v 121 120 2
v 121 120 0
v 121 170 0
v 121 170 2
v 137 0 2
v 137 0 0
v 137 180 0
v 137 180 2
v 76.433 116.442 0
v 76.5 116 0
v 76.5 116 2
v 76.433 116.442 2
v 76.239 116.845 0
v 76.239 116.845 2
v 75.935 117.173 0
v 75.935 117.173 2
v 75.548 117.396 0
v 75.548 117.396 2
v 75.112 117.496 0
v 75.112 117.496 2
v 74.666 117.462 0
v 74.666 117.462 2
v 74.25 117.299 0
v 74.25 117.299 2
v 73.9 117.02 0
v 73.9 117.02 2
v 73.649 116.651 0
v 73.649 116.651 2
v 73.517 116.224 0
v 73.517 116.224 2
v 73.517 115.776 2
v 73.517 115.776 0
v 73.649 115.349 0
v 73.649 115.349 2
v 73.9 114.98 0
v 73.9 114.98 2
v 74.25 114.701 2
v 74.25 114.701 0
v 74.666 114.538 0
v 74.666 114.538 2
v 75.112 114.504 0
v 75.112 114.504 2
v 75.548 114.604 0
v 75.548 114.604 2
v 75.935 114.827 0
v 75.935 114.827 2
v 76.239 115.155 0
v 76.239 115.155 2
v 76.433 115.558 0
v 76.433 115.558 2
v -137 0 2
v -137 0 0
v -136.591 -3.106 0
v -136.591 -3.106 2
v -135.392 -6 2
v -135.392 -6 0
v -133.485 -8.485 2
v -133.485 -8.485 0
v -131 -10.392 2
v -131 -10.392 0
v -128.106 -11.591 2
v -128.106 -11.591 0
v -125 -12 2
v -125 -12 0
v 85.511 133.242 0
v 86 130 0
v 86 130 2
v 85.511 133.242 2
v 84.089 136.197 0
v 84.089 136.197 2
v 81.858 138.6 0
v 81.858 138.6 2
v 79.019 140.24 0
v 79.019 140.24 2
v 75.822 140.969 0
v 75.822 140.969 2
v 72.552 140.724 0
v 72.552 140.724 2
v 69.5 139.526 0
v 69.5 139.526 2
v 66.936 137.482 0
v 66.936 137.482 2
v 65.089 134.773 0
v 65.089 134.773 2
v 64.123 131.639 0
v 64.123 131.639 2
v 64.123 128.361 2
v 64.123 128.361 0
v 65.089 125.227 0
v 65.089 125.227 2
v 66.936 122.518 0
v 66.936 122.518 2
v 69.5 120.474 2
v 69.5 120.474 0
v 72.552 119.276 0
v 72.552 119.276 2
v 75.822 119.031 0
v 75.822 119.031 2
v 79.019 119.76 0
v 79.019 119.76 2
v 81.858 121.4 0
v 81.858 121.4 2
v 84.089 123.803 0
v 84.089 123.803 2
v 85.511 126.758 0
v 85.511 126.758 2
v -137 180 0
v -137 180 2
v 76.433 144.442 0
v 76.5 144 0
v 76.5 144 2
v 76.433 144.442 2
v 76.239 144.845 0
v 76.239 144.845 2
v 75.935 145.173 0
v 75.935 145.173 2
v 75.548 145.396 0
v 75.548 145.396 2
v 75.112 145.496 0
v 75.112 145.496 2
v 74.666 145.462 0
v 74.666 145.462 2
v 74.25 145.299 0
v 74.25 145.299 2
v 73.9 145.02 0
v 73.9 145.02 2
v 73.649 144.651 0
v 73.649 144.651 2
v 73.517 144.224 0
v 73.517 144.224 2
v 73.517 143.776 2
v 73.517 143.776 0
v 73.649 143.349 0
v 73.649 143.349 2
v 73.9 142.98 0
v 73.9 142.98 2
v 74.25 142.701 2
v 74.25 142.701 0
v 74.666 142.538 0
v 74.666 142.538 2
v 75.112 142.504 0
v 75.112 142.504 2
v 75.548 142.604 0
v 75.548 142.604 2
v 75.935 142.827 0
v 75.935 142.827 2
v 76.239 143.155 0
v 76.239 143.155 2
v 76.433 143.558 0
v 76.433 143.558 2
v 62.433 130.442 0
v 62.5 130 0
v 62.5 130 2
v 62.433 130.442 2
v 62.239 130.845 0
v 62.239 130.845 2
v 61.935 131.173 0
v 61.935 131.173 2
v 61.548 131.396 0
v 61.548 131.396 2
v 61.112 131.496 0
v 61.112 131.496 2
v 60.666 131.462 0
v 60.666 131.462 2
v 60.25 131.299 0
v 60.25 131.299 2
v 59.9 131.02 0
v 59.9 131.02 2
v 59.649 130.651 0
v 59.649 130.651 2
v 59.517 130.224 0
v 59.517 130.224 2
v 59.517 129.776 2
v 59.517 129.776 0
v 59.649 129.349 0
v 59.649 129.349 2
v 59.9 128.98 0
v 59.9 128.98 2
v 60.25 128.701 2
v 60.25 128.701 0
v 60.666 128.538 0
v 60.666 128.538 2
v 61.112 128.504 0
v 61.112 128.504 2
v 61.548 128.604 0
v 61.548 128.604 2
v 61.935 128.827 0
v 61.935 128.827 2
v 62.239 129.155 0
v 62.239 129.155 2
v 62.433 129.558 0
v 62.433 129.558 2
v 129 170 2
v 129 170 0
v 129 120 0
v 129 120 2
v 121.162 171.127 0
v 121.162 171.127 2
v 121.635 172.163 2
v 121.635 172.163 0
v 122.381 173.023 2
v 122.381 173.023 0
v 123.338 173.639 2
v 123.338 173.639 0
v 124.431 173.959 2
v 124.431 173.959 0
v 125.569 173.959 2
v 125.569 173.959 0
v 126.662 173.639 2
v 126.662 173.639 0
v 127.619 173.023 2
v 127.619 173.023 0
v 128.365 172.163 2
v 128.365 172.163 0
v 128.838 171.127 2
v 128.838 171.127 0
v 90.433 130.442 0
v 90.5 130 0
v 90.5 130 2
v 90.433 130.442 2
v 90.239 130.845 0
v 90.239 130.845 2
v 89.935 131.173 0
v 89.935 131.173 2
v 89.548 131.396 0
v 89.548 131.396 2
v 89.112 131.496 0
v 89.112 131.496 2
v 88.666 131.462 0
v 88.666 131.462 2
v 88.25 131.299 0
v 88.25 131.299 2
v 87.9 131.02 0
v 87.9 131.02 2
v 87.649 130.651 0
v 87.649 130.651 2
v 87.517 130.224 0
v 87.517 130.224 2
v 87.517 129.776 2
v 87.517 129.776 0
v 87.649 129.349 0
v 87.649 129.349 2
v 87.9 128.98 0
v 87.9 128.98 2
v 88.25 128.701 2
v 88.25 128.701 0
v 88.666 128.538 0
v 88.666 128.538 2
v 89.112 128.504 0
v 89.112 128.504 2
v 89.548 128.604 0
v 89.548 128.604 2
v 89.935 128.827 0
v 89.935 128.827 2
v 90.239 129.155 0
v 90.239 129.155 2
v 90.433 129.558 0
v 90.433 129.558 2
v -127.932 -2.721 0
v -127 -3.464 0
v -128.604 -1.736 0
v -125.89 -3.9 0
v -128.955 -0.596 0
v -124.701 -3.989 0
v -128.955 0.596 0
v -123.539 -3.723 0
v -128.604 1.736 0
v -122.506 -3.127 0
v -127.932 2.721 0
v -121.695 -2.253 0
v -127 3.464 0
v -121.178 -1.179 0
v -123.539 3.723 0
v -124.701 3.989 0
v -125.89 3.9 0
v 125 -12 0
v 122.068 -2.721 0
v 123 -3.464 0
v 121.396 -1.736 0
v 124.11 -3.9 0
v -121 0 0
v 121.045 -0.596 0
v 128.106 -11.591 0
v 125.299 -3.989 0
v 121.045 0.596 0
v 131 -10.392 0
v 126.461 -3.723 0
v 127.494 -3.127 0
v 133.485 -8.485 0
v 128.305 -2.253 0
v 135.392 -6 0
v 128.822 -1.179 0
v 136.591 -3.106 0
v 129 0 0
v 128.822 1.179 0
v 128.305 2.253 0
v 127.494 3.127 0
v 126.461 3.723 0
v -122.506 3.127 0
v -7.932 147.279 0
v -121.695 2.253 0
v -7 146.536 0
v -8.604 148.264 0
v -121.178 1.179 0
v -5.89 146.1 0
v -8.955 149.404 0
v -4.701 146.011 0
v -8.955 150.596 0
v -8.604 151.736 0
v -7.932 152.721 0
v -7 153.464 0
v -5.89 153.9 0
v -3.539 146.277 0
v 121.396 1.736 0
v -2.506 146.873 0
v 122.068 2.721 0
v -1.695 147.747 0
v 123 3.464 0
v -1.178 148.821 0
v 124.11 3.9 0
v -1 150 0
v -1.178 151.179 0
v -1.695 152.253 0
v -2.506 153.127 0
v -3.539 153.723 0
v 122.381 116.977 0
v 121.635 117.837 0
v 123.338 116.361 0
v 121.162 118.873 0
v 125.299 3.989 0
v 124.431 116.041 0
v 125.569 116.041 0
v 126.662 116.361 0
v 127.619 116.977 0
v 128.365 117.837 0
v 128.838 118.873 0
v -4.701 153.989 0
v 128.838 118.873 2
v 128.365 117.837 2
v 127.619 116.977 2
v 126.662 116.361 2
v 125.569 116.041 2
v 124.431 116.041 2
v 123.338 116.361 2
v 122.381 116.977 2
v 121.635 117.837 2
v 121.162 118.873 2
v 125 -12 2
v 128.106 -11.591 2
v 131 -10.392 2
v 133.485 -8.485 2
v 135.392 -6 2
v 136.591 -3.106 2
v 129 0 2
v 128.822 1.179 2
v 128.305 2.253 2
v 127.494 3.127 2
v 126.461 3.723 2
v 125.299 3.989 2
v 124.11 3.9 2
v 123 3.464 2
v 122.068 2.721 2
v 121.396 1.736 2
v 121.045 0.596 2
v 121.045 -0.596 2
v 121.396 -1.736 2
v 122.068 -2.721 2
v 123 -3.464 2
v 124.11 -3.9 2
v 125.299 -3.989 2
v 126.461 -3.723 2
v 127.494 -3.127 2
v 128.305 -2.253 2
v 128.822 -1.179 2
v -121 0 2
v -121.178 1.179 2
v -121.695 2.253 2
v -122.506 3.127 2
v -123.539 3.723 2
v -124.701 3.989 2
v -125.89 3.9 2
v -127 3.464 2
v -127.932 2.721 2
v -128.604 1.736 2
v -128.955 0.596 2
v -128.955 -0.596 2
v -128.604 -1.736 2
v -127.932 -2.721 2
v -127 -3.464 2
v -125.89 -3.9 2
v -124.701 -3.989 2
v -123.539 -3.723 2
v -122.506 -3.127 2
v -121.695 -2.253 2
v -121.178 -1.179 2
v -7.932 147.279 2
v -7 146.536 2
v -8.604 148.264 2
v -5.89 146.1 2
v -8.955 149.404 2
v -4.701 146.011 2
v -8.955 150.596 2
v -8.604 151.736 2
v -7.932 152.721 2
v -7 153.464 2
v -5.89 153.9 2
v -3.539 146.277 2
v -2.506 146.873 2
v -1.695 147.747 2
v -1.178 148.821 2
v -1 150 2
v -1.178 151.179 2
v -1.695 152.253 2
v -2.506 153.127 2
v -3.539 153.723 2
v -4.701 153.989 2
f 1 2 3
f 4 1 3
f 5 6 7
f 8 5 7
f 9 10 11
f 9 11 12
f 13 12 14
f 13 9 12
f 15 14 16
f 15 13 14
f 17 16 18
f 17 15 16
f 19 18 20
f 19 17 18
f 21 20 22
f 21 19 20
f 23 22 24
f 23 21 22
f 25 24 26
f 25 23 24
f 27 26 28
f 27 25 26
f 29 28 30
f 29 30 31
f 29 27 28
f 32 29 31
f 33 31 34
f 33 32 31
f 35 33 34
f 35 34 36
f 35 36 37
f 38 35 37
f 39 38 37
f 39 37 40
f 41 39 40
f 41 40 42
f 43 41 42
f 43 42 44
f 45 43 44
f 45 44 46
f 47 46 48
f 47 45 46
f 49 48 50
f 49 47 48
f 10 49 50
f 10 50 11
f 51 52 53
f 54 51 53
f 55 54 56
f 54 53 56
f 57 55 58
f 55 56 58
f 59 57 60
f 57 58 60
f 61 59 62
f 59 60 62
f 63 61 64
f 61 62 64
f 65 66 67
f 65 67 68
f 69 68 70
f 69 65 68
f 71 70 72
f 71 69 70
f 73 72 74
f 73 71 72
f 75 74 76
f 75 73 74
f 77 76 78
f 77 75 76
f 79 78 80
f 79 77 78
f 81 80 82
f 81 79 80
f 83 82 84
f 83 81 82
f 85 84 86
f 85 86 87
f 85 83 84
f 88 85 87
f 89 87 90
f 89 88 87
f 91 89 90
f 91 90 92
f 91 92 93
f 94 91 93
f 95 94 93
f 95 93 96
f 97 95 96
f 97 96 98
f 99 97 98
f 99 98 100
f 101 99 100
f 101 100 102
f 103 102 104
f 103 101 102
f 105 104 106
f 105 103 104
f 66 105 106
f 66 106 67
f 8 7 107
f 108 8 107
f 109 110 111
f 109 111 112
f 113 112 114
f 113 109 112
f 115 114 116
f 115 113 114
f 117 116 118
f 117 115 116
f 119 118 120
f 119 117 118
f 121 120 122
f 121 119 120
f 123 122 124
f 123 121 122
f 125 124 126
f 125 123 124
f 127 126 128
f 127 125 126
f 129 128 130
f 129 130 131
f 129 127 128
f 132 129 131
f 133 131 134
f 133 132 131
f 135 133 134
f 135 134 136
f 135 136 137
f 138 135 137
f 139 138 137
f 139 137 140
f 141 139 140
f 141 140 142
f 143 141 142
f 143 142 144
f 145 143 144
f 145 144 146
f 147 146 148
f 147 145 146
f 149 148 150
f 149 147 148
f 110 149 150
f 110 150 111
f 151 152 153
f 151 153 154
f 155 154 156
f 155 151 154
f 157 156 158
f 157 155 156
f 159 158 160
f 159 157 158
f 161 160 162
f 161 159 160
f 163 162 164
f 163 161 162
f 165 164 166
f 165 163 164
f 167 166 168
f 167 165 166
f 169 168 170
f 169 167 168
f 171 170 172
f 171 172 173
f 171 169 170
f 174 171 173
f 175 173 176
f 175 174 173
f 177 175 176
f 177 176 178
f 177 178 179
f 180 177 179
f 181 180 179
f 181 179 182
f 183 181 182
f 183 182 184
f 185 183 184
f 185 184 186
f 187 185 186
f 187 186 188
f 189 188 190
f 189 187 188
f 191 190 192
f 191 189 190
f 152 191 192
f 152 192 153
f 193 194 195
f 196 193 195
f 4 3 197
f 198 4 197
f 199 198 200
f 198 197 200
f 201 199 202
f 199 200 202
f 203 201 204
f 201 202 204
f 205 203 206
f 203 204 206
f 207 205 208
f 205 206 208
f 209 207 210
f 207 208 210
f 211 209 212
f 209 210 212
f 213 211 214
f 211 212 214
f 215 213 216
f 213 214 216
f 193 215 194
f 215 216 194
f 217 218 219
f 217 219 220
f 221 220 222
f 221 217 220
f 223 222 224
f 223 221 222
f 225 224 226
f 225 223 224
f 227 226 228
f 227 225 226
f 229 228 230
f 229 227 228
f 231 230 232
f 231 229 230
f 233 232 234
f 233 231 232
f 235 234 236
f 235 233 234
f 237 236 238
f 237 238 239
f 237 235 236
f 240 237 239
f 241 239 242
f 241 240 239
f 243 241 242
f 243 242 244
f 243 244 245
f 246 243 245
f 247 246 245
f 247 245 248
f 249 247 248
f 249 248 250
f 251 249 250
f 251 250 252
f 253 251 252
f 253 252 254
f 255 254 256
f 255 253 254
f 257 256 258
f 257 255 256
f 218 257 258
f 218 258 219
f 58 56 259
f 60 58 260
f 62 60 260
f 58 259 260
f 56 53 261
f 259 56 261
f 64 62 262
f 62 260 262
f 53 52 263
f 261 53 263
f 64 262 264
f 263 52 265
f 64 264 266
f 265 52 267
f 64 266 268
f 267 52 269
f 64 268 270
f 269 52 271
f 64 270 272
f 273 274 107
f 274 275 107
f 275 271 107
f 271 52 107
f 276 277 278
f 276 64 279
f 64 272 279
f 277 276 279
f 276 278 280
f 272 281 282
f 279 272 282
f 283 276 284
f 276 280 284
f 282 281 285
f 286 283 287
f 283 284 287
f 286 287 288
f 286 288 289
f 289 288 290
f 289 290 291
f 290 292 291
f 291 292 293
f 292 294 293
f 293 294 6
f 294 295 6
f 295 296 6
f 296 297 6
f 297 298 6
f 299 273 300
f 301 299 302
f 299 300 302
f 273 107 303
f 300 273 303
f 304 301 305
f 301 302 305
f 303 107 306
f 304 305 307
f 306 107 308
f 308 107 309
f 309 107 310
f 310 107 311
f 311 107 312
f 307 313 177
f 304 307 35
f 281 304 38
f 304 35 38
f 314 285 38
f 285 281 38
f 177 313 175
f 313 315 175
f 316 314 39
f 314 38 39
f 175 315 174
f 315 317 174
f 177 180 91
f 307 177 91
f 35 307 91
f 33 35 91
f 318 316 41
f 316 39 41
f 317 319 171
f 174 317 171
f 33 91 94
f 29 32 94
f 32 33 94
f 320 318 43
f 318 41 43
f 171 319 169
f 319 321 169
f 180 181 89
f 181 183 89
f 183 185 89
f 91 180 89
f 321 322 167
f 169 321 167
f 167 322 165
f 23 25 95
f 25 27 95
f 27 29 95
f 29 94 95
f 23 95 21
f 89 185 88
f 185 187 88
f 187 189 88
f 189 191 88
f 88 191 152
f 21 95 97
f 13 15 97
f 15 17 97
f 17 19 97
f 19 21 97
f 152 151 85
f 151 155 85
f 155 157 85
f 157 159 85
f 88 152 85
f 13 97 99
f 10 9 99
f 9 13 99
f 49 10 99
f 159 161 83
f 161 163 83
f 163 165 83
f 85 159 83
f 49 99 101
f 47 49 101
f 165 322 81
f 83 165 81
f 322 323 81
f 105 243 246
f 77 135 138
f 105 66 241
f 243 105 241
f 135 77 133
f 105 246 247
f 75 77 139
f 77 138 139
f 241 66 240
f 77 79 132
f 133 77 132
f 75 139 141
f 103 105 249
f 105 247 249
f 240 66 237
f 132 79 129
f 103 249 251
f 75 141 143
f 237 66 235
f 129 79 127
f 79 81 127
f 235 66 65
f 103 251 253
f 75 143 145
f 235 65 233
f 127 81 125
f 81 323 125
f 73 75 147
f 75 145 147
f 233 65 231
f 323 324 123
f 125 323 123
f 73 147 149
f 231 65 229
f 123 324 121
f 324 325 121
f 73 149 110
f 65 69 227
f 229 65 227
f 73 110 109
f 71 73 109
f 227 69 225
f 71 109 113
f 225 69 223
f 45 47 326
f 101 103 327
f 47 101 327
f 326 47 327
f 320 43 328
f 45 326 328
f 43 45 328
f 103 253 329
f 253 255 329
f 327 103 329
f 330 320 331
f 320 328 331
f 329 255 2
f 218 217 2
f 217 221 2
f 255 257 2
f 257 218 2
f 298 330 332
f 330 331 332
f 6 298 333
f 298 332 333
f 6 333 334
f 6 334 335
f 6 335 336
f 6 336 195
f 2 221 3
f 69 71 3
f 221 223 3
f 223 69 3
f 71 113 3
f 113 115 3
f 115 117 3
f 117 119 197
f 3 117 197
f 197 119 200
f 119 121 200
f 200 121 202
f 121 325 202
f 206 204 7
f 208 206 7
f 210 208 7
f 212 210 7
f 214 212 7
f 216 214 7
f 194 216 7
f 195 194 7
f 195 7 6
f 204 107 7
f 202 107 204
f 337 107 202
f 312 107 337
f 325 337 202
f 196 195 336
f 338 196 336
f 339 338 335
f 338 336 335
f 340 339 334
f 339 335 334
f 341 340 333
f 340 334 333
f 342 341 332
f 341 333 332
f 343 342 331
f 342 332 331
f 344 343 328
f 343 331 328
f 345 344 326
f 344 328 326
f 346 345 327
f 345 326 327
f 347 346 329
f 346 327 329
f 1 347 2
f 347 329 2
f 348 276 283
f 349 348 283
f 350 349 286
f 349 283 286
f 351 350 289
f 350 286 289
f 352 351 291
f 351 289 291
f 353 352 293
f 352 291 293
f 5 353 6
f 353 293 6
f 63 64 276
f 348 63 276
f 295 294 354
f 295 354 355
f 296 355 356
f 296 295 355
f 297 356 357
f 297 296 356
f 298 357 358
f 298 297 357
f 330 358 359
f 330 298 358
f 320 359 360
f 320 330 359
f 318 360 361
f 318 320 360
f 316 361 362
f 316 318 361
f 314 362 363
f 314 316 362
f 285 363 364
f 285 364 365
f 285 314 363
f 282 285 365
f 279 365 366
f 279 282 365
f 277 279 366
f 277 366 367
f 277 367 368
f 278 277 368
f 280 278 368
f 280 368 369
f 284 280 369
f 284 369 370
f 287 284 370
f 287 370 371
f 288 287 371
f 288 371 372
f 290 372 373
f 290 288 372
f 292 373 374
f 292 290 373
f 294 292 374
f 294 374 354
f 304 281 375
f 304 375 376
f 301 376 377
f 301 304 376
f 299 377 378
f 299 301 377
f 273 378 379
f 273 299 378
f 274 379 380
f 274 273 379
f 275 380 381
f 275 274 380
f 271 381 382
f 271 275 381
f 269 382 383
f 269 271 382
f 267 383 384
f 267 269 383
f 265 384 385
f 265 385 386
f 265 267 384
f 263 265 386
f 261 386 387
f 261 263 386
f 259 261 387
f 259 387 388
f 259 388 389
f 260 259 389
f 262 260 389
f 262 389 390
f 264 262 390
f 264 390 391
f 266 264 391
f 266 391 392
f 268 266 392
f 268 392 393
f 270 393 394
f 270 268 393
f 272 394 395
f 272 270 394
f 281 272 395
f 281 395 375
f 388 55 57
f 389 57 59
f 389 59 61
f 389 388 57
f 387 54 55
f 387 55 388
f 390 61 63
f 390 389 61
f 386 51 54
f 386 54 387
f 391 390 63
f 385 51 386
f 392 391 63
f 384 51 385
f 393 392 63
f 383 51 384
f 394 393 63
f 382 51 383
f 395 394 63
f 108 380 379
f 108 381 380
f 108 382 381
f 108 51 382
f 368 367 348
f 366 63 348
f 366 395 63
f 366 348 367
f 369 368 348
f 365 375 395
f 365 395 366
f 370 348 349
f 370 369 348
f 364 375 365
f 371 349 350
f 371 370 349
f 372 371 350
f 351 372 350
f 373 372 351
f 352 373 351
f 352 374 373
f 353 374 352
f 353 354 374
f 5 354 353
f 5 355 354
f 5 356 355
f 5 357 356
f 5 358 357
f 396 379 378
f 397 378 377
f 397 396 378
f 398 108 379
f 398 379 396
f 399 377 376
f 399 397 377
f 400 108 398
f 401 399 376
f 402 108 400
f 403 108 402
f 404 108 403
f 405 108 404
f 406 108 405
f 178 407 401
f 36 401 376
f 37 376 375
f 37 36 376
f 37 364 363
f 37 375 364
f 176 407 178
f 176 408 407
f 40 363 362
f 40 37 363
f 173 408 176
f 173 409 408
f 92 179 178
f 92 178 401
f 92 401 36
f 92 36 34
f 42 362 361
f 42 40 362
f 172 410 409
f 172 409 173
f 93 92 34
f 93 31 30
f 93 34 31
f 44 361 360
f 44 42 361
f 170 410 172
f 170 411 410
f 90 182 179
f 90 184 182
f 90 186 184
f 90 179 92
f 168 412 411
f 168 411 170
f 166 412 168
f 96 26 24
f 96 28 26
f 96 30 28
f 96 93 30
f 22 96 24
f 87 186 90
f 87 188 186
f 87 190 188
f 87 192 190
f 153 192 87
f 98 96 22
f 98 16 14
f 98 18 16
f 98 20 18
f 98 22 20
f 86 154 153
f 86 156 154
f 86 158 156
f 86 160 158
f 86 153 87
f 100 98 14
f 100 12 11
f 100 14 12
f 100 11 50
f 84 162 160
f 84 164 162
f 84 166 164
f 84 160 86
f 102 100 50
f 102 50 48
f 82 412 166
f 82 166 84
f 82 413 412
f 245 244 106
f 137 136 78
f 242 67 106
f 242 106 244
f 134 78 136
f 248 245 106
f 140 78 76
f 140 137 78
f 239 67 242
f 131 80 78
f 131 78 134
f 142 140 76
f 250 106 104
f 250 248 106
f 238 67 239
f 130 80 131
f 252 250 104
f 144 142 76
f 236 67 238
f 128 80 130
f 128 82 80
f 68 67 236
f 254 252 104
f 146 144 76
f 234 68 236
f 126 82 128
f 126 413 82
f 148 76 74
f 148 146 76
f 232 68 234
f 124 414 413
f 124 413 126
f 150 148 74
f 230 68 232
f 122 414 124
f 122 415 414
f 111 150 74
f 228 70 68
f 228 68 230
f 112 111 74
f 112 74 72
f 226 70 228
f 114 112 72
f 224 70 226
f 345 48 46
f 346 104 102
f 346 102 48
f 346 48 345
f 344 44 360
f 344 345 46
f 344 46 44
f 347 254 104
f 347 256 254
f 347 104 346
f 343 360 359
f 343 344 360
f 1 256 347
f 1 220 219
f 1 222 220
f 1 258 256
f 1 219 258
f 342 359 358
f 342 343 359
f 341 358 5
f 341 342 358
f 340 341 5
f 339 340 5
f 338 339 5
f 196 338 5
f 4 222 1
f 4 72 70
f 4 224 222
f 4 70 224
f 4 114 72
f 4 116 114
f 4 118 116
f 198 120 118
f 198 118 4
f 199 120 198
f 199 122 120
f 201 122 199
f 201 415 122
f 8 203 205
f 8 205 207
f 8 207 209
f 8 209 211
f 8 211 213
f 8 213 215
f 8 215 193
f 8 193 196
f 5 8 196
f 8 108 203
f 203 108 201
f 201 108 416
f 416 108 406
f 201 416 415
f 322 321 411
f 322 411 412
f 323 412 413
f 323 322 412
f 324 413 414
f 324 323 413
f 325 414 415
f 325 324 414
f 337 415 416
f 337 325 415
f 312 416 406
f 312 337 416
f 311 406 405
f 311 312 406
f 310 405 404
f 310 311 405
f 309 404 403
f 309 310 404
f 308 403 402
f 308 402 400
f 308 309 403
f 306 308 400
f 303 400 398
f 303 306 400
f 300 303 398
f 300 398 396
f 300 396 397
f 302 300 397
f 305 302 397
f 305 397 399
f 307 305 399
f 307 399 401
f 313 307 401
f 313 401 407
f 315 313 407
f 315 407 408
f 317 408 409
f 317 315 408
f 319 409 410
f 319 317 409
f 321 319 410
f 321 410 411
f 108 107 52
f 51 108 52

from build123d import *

# Parameters (mm, degrees)
SKETCH1_R           = 4
SKETCH1_R_2         = 1.5
SKETCH1_R_3         = 11
BOSS_EXTRUDE1_DEPTH = 2


with BuildPart() as part:
    # Sketch1 → Boss-Extrude1 (new body)
    with BuildSketch(Plane.XY):
        with BuildLine():
            ThreePointArc((-137, 0), (-133.485281374, -8.485281374), (-125, -12))
            Line((-125, -12), (125, -12))
            ThreePointArc((125, -12), (133.485281374, -8.485281374), (137, 0))
            Line((137, 0), (137, 180))
            Line((137, 180), (-53.998245329, 180))
            Line((-53.998245329, 180), (-137, 180))
            Line((-137, 180), (-137, 0))
        make_face()
        with Locations((-125, 0)):
            Circle(SKETCH1_R, mode=Mode.SUBTRACT)
        with Locations((125, 0)):
            Circle(SKETCH1_R, mode=Mode.SUBTRACT)
        with Locations((-5, 150)):
            Circle(SKETCH1_R, mode=Mode.SUBTRACT)
        with Locations((61, 130)):
            Circle(SKETCH1_R_2, mode=Mode.SUBTRACT)
        with Locations((75, 116)):
            Circle(SKETCH1_R_2, mode=Mode.SUBTRACT)
        with Locations((75, 130)):
            Circle(SKETCH1_R_3, mode=Mode.SUBTRACT)
        with Locations((89, 130)):
            Circle(SKETCH1_R_2, mode=Mode.SUBTRACT)
        with Locations((75, 144)):
            Circle(SKETCH1_R_2, mode=Mode.SUBTRACT)
        with BuildLine():
            ThreePointArc((129, 120), (125, 116), (121, 120))
            Line((121, 120), (121, 170))
            ThreePointArc((121, 170), (125, 174), (129, 170))
            Line((129, 170), (129, 120))
        make_face(mode=Mode.SUBTRACT)
    extrude(amount=BOSS_EXTRUDE1_DEPTH)


solid = part.part
